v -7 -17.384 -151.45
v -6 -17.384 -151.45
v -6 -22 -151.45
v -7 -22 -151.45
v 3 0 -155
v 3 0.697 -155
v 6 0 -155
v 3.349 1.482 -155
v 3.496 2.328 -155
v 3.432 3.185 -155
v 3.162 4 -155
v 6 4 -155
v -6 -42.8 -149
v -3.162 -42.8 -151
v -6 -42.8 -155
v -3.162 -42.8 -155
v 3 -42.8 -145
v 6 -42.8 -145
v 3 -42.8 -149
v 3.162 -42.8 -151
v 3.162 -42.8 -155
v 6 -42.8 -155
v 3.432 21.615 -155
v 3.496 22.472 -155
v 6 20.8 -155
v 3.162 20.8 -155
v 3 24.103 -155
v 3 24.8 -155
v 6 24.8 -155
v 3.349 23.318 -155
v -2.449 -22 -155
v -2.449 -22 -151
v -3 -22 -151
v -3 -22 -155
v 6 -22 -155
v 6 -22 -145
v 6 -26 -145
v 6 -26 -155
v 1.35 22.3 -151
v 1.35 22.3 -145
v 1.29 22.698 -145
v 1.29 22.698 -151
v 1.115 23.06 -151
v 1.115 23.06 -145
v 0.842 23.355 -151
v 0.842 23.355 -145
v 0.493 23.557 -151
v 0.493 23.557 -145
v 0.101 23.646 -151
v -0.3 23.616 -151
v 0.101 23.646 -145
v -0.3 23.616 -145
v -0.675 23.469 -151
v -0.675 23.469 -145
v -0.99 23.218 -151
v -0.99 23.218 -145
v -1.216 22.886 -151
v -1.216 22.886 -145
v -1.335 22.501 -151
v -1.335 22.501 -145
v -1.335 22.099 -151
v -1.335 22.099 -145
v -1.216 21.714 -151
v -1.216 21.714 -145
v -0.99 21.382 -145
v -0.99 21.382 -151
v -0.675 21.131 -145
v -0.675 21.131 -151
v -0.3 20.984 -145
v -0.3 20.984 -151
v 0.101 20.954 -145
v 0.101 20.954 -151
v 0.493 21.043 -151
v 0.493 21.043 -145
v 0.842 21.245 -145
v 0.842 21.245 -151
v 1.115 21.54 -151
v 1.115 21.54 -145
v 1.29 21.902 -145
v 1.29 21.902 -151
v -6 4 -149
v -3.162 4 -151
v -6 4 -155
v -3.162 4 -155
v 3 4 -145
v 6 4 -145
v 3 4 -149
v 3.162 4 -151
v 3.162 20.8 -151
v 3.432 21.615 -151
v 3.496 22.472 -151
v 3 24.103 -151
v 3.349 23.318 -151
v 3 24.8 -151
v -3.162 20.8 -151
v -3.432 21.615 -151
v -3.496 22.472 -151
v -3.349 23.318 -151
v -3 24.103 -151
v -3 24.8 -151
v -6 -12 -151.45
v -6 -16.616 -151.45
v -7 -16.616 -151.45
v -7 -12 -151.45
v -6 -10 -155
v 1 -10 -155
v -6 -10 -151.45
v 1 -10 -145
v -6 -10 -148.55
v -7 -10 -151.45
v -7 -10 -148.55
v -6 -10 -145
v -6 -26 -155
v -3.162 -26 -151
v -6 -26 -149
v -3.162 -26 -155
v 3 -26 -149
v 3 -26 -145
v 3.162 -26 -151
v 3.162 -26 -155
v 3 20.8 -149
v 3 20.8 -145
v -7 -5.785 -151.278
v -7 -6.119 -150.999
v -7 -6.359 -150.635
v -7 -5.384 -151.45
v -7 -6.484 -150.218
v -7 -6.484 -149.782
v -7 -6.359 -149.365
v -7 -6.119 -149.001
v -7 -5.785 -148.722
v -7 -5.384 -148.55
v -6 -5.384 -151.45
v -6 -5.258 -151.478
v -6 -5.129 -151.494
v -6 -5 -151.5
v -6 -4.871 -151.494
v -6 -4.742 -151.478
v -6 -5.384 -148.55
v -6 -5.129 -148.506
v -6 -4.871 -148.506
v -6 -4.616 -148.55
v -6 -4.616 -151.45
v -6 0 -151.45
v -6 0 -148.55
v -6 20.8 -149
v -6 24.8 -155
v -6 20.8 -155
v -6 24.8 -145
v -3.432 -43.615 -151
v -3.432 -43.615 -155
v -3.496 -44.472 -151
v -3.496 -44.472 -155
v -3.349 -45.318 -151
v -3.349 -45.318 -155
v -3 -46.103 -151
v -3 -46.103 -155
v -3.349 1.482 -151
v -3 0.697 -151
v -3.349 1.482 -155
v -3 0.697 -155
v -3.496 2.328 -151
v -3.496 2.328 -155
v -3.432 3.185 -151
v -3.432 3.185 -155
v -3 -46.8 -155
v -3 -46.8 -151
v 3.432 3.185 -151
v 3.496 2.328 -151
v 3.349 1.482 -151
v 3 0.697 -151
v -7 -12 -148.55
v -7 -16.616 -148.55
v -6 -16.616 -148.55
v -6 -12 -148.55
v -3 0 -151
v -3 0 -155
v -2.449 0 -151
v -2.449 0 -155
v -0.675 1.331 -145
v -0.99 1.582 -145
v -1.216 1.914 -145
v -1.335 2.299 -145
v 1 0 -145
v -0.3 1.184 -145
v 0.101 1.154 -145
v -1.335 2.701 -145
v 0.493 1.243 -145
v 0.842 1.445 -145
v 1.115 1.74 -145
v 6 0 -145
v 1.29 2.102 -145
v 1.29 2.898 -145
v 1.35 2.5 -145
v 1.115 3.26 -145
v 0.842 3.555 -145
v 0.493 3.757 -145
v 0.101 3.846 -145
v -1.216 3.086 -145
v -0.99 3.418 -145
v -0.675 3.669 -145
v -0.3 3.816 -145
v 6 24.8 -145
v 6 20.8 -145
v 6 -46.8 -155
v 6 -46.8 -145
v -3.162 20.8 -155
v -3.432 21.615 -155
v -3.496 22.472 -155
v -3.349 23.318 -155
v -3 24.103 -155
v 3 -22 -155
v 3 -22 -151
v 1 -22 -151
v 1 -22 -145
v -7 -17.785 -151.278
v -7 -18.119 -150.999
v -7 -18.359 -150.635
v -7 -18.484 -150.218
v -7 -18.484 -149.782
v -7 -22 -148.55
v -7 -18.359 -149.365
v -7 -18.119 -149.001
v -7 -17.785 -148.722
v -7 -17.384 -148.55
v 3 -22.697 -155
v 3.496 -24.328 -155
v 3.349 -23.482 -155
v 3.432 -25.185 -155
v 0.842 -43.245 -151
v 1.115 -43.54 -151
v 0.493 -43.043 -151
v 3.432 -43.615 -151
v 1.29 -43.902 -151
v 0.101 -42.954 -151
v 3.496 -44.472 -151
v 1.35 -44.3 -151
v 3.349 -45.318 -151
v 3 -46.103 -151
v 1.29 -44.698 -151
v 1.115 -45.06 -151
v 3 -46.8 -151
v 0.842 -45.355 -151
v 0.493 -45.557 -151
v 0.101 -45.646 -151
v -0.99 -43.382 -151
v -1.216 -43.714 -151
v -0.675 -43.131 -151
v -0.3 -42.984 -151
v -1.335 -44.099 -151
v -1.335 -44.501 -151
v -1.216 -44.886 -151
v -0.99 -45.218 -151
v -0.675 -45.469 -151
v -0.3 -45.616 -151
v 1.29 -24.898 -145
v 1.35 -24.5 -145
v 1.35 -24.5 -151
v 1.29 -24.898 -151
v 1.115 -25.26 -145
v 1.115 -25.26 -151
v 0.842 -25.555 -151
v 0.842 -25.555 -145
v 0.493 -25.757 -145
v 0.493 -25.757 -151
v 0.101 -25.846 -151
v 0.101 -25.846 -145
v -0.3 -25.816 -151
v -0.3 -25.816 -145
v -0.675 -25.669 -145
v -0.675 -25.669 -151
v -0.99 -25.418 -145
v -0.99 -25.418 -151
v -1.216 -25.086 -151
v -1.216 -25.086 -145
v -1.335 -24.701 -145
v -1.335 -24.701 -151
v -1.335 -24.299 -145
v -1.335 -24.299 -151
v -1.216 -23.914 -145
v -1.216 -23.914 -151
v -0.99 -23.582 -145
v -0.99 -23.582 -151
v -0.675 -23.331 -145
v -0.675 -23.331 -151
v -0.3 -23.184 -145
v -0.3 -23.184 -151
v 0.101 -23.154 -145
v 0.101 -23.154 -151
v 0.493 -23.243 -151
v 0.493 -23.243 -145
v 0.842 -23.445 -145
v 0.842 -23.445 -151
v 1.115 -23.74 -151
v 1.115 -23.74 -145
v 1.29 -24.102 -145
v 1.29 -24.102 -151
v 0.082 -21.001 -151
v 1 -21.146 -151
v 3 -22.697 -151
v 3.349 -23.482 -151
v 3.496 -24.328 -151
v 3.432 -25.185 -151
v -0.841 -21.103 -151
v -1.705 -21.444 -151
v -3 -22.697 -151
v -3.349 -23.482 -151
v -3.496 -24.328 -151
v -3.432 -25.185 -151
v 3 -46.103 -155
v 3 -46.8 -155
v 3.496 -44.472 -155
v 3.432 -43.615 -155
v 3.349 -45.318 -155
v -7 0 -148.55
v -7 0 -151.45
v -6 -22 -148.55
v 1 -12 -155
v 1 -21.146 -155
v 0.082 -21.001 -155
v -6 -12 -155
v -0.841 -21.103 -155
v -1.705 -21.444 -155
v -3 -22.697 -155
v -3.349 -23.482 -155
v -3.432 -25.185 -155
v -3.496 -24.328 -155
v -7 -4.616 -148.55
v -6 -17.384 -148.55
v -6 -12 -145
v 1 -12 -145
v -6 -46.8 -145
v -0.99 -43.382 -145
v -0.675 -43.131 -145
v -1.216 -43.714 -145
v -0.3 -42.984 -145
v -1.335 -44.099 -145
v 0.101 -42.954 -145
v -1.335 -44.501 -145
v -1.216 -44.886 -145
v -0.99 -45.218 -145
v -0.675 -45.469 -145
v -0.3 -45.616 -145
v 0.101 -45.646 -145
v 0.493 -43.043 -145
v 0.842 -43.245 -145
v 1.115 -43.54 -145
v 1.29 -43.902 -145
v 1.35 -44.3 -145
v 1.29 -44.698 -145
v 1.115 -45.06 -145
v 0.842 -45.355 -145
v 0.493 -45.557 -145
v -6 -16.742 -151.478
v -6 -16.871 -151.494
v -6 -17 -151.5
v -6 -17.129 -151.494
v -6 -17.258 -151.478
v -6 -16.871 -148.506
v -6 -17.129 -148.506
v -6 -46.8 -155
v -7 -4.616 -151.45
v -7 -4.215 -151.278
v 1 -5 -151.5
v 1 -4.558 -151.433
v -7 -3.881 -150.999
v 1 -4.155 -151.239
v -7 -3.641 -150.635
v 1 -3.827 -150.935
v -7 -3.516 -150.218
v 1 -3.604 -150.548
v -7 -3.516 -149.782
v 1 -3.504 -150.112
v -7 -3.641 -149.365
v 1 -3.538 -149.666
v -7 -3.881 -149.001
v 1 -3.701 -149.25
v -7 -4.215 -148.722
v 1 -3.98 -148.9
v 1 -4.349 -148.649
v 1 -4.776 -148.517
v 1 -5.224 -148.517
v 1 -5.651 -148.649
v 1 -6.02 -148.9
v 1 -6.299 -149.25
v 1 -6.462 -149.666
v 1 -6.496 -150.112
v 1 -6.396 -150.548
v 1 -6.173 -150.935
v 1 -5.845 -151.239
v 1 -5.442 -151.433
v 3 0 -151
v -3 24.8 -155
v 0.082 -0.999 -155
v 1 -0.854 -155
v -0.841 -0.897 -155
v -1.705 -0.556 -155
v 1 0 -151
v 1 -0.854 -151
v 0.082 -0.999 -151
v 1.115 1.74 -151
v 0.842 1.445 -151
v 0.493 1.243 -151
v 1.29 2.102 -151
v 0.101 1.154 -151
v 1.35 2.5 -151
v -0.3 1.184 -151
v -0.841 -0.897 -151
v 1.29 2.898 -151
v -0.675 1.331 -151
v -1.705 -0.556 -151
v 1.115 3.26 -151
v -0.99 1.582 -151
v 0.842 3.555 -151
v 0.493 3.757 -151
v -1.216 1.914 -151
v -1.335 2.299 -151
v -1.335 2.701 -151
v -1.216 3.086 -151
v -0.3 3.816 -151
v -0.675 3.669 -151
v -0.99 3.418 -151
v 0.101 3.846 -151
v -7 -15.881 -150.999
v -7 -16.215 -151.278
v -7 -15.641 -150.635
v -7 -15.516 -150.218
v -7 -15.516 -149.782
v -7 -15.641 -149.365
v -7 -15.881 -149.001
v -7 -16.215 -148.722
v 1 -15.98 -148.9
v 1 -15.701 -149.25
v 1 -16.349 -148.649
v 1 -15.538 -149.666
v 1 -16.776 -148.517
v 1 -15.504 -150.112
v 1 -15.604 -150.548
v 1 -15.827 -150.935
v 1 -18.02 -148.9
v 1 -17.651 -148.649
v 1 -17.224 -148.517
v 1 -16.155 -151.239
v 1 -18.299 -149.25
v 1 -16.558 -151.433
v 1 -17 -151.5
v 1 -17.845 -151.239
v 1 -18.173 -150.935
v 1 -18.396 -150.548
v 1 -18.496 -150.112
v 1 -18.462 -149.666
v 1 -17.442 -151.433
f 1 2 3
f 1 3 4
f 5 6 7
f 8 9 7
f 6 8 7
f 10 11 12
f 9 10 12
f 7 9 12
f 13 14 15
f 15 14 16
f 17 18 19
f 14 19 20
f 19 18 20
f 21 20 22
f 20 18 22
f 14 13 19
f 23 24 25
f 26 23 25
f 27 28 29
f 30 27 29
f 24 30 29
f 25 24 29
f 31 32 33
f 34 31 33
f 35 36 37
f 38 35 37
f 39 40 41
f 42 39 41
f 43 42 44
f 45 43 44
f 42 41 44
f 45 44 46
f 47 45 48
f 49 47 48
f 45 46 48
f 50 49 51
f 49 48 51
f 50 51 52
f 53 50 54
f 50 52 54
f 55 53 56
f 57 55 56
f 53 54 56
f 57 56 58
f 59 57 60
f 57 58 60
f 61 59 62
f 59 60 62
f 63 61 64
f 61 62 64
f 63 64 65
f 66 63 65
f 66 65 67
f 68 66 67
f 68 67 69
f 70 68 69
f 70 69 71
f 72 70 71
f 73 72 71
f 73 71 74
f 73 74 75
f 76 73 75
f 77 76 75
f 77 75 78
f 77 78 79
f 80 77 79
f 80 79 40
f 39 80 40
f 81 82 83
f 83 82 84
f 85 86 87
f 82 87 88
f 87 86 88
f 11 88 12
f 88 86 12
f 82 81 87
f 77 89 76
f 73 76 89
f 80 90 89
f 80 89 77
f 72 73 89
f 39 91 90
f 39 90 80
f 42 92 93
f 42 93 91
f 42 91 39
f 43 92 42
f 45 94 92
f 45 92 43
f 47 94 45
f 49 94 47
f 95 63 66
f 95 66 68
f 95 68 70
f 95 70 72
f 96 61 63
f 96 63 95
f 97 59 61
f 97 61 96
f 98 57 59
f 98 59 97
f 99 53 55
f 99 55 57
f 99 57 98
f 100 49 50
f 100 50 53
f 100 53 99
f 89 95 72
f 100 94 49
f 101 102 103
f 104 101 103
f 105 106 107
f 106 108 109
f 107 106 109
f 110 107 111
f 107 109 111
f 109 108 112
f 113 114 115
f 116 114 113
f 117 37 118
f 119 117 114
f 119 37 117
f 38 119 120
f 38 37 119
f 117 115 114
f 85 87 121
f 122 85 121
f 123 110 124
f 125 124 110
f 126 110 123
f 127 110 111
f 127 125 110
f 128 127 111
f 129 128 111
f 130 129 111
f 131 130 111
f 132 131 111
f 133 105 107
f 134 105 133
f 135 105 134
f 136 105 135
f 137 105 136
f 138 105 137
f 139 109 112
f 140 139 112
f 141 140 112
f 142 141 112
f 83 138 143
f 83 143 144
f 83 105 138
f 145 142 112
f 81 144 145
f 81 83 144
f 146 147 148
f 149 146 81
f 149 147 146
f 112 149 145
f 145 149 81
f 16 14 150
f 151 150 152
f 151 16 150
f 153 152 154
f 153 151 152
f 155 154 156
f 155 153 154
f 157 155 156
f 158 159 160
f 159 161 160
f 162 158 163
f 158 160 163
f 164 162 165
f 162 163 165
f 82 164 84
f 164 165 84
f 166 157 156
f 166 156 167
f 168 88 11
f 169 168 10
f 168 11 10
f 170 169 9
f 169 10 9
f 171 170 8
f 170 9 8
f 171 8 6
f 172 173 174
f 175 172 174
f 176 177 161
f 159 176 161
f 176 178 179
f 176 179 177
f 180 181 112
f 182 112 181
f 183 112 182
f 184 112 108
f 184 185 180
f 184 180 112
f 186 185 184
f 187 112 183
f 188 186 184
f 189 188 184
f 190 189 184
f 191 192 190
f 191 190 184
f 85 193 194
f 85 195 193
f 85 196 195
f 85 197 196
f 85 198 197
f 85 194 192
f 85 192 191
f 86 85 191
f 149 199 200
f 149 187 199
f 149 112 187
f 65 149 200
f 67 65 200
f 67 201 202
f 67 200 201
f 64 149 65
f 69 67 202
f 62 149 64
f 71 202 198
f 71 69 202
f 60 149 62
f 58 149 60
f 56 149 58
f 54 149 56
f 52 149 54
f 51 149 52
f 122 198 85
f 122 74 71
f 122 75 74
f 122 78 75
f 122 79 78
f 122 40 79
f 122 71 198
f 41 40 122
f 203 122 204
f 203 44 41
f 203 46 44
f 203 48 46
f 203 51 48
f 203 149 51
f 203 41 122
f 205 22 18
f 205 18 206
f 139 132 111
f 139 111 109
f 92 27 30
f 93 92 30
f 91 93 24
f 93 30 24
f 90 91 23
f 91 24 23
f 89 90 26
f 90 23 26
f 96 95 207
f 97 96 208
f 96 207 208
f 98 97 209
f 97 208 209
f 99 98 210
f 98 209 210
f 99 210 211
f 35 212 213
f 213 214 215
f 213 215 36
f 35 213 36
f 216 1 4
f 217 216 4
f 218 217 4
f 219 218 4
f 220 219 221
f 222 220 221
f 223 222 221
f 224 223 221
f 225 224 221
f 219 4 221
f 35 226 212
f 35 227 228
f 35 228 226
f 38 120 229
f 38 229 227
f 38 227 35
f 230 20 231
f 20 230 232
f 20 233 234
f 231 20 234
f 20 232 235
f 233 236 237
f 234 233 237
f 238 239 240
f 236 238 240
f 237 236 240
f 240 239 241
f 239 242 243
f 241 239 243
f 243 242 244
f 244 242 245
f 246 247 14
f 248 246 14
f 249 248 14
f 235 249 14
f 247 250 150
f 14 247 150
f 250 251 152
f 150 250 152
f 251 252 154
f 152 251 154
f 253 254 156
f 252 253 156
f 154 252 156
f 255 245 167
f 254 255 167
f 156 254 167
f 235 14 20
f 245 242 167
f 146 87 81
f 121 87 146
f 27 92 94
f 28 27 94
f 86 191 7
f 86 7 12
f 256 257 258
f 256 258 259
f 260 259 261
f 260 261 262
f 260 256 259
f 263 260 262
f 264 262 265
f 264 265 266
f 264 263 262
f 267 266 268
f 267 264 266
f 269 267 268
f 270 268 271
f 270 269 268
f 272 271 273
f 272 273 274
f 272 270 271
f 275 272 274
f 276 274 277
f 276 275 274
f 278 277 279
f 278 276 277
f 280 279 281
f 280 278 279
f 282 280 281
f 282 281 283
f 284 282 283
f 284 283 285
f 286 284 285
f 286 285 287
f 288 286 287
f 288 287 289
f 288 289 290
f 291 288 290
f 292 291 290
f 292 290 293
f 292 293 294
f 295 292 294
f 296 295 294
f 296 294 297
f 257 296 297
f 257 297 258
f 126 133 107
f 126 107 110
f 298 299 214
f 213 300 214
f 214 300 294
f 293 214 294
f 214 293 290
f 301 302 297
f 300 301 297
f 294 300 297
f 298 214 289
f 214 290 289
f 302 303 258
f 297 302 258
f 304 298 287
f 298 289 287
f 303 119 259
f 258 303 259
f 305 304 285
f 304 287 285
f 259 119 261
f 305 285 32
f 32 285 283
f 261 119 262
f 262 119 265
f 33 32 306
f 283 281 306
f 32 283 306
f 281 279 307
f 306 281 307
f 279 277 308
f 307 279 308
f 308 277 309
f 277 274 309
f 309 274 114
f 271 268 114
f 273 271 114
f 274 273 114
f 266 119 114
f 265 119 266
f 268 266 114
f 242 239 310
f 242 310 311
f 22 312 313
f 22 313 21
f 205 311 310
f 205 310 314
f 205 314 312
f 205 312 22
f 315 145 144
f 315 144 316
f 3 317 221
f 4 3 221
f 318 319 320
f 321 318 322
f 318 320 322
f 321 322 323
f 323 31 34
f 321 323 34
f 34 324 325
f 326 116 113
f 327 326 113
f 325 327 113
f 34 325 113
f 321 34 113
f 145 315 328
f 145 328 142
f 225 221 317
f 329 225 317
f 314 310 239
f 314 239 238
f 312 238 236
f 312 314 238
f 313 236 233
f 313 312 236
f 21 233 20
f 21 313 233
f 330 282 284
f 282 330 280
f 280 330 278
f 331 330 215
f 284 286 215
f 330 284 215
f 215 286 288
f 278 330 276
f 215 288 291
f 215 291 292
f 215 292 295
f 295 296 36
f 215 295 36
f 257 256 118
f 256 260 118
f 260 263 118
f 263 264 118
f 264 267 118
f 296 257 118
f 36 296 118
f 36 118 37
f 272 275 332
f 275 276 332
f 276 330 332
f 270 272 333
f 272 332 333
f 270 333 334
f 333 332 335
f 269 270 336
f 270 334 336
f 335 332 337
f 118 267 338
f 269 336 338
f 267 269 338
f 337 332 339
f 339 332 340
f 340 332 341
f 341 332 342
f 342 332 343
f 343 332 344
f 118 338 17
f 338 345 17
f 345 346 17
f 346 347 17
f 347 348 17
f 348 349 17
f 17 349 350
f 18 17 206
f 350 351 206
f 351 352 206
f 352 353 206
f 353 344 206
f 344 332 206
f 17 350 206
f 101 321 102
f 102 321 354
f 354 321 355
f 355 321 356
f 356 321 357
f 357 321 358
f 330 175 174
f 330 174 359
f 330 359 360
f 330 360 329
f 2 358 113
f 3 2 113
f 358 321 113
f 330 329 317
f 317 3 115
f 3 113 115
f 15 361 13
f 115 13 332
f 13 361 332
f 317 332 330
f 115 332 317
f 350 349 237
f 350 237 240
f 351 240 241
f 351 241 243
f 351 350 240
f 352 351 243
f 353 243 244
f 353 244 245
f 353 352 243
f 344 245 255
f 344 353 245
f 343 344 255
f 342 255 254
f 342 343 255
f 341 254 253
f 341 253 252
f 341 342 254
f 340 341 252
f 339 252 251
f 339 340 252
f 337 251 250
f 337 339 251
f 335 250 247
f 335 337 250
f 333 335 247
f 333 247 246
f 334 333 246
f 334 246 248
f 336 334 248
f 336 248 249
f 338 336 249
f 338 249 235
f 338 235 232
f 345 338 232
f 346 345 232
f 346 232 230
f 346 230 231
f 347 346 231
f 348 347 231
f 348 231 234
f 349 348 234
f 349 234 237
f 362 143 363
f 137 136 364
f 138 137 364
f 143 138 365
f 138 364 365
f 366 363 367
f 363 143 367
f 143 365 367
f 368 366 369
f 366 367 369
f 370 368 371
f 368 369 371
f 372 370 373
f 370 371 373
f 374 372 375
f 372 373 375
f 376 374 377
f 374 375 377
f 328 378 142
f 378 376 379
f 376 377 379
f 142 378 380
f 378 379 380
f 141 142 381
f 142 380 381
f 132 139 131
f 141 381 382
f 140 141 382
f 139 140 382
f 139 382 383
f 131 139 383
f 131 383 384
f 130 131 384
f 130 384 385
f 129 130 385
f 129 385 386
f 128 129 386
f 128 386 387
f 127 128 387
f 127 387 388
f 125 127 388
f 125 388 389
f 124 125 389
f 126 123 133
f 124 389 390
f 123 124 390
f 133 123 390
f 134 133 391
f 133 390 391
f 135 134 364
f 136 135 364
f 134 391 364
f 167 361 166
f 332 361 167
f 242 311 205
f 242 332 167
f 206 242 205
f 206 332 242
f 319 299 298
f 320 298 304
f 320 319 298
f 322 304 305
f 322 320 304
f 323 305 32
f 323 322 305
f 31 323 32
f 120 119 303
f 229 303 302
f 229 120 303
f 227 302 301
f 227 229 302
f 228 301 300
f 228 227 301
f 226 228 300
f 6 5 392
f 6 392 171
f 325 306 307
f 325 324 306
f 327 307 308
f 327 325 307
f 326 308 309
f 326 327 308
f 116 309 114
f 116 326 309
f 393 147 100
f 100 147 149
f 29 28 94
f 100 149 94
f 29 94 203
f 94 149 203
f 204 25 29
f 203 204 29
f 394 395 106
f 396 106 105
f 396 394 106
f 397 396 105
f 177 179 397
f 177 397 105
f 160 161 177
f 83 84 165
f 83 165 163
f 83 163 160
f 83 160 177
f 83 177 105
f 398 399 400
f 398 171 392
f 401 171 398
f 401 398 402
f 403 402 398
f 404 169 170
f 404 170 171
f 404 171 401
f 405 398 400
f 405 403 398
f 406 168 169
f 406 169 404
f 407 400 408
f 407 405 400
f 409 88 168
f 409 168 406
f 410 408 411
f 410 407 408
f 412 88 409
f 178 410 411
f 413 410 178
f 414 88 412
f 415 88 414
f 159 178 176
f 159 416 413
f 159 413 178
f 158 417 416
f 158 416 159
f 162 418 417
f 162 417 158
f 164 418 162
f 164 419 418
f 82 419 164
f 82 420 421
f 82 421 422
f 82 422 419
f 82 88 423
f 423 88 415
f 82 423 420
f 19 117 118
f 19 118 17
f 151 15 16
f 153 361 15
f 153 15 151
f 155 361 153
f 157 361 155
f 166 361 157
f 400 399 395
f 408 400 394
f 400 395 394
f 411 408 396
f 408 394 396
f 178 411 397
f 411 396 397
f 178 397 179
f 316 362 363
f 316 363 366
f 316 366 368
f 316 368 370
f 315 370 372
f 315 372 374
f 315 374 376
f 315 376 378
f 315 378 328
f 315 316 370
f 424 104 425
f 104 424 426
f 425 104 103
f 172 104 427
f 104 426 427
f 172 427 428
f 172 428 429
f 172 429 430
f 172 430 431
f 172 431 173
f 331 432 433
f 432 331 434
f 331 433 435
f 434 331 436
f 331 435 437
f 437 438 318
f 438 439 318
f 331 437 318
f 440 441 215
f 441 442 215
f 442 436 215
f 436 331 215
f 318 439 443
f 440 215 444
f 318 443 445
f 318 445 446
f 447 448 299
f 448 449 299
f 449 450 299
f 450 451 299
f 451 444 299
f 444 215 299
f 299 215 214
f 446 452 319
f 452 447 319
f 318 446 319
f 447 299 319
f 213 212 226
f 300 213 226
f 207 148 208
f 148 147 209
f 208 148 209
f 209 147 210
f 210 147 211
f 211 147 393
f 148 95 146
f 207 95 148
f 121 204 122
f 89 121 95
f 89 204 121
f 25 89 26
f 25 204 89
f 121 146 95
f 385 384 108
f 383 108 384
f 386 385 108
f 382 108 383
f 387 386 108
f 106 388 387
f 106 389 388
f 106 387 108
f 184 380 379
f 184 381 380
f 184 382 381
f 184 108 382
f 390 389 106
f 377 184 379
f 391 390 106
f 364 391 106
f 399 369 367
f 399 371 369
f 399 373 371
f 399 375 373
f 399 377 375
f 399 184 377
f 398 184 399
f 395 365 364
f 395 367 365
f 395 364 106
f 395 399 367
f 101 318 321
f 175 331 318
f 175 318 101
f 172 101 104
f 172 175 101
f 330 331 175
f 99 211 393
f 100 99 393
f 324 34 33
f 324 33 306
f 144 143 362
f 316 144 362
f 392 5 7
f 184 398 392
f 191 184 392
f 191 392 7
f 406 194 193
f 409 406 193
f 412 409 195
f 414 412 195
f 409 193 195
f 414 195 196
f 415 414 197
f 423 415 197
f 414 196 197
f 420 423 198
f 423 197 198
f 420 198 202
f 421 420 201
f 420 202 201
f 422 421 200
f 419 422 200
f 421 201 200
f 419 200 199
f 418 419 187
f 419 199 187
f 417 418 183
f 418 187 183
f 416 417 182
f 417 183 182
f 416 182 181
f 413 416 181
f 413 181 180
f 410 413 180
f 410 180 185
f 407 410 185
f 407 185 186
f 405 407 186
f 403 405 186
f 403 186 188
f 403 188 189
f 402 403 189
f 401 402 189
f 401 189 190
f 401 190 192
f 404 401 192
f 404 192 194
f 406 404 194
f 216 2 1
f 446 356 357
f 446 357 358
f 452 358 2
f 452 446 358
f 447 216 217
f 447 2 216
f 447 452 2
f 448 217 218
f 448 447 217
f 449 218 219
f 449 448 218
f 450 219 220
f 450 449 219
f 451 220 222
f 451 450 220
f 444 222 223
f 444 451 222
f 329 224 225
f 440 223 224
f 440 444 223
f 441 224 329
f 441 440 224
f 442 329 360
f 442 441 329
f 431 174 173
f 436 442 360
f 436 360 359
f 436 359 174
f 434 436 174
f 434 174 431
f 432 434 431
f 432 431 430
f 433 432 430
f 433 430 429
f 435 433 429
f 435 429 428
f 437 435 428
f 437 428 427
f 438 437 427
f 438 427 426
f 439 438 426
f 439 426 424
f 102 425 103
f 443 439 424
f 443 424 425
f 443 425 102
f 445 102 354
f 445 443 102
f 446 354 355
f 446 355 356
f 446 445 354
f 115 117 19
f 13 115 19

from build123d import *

# Parameters (mm, degrees)
SKETCH7_W           = 12
SKETCH7_H           = 24.8
MAIN_DEPTH          = 5
SKETCH8_R           = 1.35
HOLES_DEPTH         = 11
SKETCH16_W          = 6
SKETCH16_H          = 16.8
FIXEXTRUSION_DEPTH  = 13
SKETCH17_W          = 6
SKETCH17_H          = 24.8
CUT_EXTRUDE1_DEPTH  = 4
SKETCH18_W          = 3
SKETCH18_H          = 16.8
CUT_EXTRUDE2_DEPTH  = 5
BOSS_EXTRUDE1_DEPTH = 10
SKETCH20_R          = 1.5
CUT_EXTRUDE3_DEPTH  = 9
SKETCH21_R          = 3.5
CUT_EXTRUDE4_DEPTH  = 4


with BuildPart() as part:
    # Sketch7 → Main (new body, symmetric)
    with BuildSketch(Plane.XY.offset(-150)):
        with Locations((0, 12.4)):
            Rectangle(SKETCH7_W, SKETCH7_H)
    extrude(amount=MAIN_DEPTH, both=True)

    # Sketch8 → Holes (cut, through all)
    with BuildSketch(Plane.XY.offset(-145)):
        with Locations((0, 22.3)):
            Circle(SKETCH8_R)
        with Locations((0, 2.5)):
            Circle(SKETCH8_R)
    extrude(amount=-HOLES_DEPTH, mode=Mode.SUBTRACT)

    # Sketch16 → FixExtrusion (cut, through all)
    with BuildSketch(Plane(origin=(6, 0, 0), x_dir=(0, 0, -1), z_dir=(1, 0, 0))):
        with Locations((152, 12.4)):
            Rectangle(SKETCH16_W, SKETCH16_H)
    extrude(amount=-FIXEXTRUSION_DEPTH, mode=Mode.SUBTRACT)

    # Sketch17 → Cut-Extrude1 (cut)
    with BuildSketch(Plane(origin=(0, 0, -155), x_dir=(-1, 0, 0), z_dir=(0, 0, -1))):
        with Locations((0, 12.4)):
            Rectangle(SKETCH17_W, SKETCH17_H)
    extrude(amount=-CUT_EXTRUDE1_DEPTH, mode=Mode.SUBTRACT)

    # Sketch18 → Cut-Extrude2 (cut, through all)
    with BuildSketch(Plane(origin=(0, 0, -149), x_dir=(-1, 0, 0), z_dir=(0, 0, -1))):
        with Locations((-4.5, 12.4)):
            Rectangle(SKETCH18_W, SKETCH18_H)
    extrude(amount=-CUT_EXTRUDE2_DEPTH, mode=Mode.SUBTRACT)

    # Sketch19 → Boss-Extrude1 (add)
    with BuildSketch(Plane.XZ):
        Polygon((1, -155), (-6, -155), (-6, -151.45), (-7, -151.45), (-7, -148.55), (-6, -148.55), (-6, -145), (1, -145), align=None)
    extrude(amount=BOSS_EXTRUDE1_DEPTH)

    # Sketch20 → Cut-Extrude3 (cut, through all)
    with BuildSketch(Plane(origin=(1, 0, 0), x_dir=(0, 0, -1), z_dir=(1, 0, 0))):
        with Locations((150, -5)):
            Circle(SKETCH20_R)
    extrude(amount=-CUT_EXTRUDE3_DEPTH, mode=Mode.SUBTRACT)

    # Sketch21 → Cut-Extrude4 (cut)
    with BuildSketch(Plane(origin=(0, 0, -155), x_dir=(-1, 0, 0), z_dir=(0, 0, -1))):
        with Locations((0, 2.5)):
            Circle(SKETCH21_R)
        with Locations((0, 22.3)):
            Circle(SKETCH21_R)
    extrude(amount=-CUT_EXTRUDE4_DEPTH, mode=Mode.SUBTRACT)


with BuildPart() as body_2:
    # Mirror2: mirrored copy
    add(part.part.mirror(Plane(origin=(0, -11, 0), x_dir=(0, 0, 1), z_dir=(0, -1, 0))))


solid = Compound([part.part, body_2.part])
